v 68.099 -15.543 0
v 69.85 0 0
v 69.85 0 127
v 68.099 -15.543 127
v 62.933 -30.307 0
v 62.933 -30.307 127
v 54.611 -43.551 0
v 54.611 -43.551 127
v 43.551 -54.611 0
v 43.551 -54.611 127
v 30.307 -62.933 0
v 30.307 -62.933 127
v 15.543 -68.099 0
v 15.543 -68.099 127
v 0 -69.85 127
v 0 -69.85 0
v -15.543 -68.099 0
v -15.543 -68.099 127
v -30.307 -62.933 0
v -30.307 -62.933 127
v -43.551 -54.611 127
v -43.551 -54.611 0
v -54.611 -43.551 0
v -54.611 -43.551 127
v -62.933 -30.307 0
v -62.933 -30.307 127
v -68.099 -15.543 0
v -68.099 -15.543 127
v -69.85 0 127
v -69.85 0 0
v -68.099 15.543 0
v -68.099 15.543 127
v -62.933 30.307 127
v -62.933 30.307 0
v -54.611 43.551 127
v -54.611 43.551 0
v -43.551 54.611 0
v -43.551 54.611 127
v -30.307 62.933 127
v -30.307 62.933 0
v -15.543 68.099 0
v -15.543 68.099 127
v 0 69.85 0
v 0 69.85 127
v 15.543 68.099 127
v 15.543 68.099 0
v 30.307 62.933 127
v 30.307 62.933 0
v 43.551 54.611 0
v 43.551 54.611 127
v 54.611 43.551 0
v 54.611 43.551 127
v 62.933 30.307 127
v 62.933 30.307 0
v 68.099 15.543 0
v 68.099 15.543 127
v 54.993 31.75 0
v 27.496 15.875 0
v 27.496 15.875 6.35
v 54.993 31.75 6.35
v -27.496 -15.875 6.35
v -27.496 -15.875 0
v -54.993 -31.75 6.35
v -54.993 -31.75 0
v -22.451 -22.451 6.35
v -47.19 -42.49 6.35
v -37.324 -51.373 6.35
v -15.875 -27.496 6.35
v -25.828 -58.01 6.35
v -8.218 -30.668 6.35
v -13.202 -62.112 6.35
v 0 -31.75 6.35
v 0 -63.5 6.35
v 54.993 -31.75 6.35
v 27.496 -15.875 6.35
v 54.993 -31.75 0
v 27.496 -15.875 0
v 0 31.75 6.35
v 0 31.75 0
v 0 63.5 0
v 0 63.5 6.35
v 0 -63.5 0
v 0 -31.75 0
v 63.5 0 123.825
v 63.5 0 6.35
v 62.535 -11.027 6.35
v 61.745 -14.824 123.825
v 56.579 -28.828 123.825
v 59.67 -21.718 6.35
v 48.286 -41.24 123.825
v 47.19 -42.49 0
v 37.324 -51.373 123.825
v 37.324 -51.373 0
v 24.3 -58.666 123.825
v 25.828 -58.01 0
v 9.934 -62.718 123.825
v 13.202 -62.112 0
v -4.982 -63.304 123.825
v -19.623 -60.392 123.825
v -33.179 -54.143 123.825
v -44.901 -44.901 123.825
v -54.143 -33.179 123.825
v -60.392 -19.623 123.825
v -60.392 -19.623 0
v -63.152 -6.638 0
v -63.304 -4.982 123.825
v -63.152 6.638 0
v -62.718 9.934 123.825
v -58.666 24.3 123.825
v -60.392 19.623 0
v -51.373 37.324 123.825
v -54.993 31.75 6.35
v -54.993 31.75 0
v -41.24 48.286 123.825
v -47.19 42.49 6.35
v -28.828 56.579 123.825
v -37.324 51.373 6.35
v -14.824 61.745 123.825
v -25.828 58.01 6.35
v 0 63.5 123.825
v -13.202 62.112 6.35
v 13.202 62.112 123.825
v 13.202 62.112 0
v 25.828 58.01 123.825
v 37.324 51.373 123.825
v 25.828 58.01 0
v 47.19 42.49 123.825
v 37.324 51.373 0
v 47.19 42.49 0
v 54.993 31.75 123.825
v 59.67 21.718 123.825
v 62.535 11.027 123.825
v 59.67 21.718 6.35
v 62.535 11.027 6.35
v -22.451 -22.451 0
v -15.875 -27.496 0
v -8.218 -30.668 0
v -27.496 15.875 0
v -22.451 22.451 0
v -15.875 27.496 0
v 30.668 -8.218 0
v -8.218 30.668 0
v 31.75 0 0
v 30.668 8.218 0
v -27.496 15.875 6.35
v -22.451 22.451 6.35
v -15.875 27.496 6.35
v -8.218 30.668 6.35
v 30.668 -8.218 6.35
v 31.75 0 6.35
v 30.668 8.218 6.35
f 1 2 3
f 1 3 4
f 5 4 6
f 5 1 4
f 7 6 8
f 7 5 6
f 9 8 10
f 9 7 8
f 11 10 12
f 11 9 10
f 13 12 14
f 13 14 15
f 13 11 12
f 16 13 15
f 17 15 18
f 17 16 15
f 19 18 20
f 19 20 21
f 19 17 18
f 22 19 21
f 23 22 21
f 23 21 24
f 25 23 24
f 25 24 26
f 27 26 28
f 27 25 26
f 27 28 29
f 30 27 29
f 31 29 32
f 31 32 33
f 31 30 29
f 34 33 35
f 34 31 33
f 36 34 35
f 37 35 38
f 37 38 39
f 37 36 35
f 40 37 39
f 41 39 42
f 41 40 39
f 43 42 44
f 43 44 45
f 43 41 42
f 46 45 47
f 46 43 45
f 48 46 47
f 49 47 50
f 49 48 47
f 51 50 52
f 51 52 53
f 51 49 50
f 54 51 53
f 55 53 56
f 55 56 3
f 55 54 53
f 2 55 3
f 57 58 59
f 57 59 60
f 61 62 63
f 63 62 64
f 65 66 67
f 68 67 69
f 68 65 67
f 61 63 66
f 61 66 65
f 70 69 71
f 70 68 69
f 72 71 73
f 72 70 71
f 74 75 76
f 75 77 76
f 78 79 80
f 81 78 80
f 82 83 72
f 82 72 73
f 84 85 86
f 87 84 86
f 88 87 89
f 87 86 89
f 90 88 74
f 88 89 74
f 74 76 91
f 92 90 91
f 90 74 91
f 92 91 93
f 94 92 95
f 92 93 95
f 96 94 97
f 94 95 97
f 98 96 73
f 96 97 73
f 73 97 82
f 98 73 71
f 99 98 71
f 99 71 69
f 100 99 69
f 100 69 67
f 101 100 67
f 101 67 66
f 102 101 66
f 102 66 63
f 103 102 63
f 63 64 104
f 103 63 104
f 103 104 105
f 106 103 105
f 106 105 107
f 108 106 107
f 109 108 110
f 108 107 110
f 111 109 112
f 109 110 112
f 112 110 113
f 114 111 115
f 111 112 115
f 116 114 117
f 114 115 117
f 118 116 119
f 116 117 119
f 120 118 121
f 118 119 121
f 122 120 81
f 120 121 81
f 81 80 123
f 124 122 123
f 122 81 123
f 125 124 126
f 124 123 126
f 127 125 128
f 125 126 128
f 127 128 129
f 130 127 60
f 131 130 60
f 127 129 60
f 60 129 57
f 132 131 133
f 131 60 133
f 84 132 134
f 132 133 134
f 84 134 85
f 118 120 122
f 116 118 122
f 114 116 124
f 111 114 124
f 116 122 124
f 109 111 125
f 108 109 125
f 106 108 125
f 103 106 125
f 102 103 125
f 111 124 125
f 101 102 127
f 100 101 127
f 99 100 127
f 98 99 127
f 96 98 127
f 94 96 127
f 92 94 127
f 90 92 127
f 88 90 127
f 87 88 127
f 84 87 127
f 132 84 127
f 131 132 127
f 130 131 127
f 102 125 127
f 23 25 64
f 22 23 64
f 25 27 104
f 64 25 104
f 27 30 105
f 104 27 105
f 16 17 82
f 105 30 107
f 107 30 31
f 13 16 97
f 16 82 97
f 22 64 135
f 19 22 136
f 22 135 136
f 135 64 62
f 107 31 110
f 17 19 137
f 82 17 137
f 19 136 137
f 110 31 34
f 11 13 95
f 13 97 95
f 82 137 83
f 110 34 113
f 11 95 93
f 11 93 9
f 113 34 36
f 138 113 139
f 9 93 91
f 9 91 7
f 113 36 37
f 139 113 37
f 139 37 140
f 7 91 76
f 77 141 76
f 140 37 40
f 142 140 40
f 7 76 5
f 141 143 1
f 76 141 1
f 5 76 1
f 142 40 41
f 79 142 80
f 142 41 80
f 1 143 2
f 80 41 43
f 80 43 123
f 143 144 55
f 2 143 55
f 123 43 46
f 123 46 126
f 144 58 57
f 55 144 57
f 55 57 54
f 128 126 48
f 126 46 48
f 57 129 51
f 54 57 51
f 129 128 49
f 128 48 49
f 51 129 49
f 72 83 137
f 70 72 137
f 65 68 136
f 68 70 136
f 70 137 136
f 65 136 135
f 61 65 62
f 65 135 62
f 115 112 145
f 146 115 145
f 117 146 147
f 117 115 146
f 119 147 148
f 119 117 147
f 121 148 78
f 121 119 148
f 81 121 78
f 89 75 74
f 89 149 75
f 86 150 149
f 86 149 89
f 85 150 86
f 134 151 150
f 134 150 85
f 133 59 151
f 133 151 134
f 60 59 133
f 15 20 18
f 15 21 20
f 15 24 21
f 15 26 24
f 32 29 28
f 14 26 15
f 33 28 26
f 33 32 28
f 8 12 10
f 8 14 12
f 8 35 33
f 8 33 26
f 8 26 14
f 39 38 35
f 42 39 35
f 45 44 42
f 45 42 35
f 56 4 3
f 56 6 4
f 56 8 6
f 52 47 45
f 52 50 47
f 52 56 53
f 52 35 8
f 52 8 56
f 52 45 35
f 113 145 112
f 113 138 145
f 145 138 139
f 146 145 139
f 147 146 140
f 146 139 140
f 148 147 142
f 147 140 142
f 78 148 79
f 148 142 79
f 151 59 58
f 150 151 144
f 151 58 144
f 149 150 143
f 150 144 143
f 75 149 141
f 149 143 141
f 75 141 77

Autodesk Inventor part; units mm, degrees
ref_plane "YZ Plane" through (0, 0, 0) normal (1, 0, 0) x (0, 1, 0)
ref_plane "XZ Plane" through (0, 0, 0) normal (0, 1, 0) x (-1, 0, 0)
ref_plane "XY Plane" through (0, 0, 0) normal (0, 0, 1) x (1, 0, 0)
sketch "Sketch1" plane through (0, 0, 0) normal (0, 0, 1) x (1, 0, 0)
  circle A0 centre (0, 0) radius 31.75
  circle A1 centre (0, 0) radius 63.5
  circle A2 centre (0, 0) radius 69.85
  line L0 (0, 0) -> (0, 69.85)
  line L1 (0, 0) -> (-60.4919, 34.925)
  line L2 (0, 0) -> (-60.4919, -34.925)
  line L3 (0, 0) -> (0, -69.85)
  line L4 (0, 0) -> (60.4919, -34.925)
  line L5 (0, 0) -> (60.4919, 34.925)
  point P0 (54.9926, 31.75)
  point P1 (27.4963, 15.875)
  point P2 (27.4963, -15.875)
  point P3 (54.9926, -31.75)
  point P4 (0, -63.5)
  point P5 (0, -31.75)
  point P6 (-27.4963, -15.875)
  point P7 (-54.9926, -31.75)
  point P8 (-54.9926, 31.75)
  point P9 (-27.4963, 15.875)
  point P10 (0, 31.75)
  point P11 (0, 63.5)
  dimension "d16" = 139.7
  dimension "d5" = 360
  dimension "d14" = 127
  dimension "d15" = 63.5
extrude "Extrusion1" add sketch "Sketch1" along normal blind 127 contours L5 A2 L4 A1 | A1 L0 A2 L5 | L4 A2 L3 A1 | A1 L1 A2 L0 | L3 A2 L2 A1 | A1 L2 A2 L1
extrude "Extrusion2" add sketch "Sketch1" along normal blind 6.35 contours A0 L5 A1 L4 | A0 L1 A1 L0 | L3 A1 L2 A0
sketch "Sketch2" plane through (0, 0, 127) normal (0, 0, 1) x (1, 0, 0)
  arc A0 (54.9926, 31.75) -> (0, 63.5) centre (0, 0) ccw projected
  circle A1 centre (0, 0) radius 63.5
  point P0 (54.9926, 31.75)
extrude "Extrusion3" add sketch "Sketch2" against normal blind 3.175
properties part number "Powder Canister"
